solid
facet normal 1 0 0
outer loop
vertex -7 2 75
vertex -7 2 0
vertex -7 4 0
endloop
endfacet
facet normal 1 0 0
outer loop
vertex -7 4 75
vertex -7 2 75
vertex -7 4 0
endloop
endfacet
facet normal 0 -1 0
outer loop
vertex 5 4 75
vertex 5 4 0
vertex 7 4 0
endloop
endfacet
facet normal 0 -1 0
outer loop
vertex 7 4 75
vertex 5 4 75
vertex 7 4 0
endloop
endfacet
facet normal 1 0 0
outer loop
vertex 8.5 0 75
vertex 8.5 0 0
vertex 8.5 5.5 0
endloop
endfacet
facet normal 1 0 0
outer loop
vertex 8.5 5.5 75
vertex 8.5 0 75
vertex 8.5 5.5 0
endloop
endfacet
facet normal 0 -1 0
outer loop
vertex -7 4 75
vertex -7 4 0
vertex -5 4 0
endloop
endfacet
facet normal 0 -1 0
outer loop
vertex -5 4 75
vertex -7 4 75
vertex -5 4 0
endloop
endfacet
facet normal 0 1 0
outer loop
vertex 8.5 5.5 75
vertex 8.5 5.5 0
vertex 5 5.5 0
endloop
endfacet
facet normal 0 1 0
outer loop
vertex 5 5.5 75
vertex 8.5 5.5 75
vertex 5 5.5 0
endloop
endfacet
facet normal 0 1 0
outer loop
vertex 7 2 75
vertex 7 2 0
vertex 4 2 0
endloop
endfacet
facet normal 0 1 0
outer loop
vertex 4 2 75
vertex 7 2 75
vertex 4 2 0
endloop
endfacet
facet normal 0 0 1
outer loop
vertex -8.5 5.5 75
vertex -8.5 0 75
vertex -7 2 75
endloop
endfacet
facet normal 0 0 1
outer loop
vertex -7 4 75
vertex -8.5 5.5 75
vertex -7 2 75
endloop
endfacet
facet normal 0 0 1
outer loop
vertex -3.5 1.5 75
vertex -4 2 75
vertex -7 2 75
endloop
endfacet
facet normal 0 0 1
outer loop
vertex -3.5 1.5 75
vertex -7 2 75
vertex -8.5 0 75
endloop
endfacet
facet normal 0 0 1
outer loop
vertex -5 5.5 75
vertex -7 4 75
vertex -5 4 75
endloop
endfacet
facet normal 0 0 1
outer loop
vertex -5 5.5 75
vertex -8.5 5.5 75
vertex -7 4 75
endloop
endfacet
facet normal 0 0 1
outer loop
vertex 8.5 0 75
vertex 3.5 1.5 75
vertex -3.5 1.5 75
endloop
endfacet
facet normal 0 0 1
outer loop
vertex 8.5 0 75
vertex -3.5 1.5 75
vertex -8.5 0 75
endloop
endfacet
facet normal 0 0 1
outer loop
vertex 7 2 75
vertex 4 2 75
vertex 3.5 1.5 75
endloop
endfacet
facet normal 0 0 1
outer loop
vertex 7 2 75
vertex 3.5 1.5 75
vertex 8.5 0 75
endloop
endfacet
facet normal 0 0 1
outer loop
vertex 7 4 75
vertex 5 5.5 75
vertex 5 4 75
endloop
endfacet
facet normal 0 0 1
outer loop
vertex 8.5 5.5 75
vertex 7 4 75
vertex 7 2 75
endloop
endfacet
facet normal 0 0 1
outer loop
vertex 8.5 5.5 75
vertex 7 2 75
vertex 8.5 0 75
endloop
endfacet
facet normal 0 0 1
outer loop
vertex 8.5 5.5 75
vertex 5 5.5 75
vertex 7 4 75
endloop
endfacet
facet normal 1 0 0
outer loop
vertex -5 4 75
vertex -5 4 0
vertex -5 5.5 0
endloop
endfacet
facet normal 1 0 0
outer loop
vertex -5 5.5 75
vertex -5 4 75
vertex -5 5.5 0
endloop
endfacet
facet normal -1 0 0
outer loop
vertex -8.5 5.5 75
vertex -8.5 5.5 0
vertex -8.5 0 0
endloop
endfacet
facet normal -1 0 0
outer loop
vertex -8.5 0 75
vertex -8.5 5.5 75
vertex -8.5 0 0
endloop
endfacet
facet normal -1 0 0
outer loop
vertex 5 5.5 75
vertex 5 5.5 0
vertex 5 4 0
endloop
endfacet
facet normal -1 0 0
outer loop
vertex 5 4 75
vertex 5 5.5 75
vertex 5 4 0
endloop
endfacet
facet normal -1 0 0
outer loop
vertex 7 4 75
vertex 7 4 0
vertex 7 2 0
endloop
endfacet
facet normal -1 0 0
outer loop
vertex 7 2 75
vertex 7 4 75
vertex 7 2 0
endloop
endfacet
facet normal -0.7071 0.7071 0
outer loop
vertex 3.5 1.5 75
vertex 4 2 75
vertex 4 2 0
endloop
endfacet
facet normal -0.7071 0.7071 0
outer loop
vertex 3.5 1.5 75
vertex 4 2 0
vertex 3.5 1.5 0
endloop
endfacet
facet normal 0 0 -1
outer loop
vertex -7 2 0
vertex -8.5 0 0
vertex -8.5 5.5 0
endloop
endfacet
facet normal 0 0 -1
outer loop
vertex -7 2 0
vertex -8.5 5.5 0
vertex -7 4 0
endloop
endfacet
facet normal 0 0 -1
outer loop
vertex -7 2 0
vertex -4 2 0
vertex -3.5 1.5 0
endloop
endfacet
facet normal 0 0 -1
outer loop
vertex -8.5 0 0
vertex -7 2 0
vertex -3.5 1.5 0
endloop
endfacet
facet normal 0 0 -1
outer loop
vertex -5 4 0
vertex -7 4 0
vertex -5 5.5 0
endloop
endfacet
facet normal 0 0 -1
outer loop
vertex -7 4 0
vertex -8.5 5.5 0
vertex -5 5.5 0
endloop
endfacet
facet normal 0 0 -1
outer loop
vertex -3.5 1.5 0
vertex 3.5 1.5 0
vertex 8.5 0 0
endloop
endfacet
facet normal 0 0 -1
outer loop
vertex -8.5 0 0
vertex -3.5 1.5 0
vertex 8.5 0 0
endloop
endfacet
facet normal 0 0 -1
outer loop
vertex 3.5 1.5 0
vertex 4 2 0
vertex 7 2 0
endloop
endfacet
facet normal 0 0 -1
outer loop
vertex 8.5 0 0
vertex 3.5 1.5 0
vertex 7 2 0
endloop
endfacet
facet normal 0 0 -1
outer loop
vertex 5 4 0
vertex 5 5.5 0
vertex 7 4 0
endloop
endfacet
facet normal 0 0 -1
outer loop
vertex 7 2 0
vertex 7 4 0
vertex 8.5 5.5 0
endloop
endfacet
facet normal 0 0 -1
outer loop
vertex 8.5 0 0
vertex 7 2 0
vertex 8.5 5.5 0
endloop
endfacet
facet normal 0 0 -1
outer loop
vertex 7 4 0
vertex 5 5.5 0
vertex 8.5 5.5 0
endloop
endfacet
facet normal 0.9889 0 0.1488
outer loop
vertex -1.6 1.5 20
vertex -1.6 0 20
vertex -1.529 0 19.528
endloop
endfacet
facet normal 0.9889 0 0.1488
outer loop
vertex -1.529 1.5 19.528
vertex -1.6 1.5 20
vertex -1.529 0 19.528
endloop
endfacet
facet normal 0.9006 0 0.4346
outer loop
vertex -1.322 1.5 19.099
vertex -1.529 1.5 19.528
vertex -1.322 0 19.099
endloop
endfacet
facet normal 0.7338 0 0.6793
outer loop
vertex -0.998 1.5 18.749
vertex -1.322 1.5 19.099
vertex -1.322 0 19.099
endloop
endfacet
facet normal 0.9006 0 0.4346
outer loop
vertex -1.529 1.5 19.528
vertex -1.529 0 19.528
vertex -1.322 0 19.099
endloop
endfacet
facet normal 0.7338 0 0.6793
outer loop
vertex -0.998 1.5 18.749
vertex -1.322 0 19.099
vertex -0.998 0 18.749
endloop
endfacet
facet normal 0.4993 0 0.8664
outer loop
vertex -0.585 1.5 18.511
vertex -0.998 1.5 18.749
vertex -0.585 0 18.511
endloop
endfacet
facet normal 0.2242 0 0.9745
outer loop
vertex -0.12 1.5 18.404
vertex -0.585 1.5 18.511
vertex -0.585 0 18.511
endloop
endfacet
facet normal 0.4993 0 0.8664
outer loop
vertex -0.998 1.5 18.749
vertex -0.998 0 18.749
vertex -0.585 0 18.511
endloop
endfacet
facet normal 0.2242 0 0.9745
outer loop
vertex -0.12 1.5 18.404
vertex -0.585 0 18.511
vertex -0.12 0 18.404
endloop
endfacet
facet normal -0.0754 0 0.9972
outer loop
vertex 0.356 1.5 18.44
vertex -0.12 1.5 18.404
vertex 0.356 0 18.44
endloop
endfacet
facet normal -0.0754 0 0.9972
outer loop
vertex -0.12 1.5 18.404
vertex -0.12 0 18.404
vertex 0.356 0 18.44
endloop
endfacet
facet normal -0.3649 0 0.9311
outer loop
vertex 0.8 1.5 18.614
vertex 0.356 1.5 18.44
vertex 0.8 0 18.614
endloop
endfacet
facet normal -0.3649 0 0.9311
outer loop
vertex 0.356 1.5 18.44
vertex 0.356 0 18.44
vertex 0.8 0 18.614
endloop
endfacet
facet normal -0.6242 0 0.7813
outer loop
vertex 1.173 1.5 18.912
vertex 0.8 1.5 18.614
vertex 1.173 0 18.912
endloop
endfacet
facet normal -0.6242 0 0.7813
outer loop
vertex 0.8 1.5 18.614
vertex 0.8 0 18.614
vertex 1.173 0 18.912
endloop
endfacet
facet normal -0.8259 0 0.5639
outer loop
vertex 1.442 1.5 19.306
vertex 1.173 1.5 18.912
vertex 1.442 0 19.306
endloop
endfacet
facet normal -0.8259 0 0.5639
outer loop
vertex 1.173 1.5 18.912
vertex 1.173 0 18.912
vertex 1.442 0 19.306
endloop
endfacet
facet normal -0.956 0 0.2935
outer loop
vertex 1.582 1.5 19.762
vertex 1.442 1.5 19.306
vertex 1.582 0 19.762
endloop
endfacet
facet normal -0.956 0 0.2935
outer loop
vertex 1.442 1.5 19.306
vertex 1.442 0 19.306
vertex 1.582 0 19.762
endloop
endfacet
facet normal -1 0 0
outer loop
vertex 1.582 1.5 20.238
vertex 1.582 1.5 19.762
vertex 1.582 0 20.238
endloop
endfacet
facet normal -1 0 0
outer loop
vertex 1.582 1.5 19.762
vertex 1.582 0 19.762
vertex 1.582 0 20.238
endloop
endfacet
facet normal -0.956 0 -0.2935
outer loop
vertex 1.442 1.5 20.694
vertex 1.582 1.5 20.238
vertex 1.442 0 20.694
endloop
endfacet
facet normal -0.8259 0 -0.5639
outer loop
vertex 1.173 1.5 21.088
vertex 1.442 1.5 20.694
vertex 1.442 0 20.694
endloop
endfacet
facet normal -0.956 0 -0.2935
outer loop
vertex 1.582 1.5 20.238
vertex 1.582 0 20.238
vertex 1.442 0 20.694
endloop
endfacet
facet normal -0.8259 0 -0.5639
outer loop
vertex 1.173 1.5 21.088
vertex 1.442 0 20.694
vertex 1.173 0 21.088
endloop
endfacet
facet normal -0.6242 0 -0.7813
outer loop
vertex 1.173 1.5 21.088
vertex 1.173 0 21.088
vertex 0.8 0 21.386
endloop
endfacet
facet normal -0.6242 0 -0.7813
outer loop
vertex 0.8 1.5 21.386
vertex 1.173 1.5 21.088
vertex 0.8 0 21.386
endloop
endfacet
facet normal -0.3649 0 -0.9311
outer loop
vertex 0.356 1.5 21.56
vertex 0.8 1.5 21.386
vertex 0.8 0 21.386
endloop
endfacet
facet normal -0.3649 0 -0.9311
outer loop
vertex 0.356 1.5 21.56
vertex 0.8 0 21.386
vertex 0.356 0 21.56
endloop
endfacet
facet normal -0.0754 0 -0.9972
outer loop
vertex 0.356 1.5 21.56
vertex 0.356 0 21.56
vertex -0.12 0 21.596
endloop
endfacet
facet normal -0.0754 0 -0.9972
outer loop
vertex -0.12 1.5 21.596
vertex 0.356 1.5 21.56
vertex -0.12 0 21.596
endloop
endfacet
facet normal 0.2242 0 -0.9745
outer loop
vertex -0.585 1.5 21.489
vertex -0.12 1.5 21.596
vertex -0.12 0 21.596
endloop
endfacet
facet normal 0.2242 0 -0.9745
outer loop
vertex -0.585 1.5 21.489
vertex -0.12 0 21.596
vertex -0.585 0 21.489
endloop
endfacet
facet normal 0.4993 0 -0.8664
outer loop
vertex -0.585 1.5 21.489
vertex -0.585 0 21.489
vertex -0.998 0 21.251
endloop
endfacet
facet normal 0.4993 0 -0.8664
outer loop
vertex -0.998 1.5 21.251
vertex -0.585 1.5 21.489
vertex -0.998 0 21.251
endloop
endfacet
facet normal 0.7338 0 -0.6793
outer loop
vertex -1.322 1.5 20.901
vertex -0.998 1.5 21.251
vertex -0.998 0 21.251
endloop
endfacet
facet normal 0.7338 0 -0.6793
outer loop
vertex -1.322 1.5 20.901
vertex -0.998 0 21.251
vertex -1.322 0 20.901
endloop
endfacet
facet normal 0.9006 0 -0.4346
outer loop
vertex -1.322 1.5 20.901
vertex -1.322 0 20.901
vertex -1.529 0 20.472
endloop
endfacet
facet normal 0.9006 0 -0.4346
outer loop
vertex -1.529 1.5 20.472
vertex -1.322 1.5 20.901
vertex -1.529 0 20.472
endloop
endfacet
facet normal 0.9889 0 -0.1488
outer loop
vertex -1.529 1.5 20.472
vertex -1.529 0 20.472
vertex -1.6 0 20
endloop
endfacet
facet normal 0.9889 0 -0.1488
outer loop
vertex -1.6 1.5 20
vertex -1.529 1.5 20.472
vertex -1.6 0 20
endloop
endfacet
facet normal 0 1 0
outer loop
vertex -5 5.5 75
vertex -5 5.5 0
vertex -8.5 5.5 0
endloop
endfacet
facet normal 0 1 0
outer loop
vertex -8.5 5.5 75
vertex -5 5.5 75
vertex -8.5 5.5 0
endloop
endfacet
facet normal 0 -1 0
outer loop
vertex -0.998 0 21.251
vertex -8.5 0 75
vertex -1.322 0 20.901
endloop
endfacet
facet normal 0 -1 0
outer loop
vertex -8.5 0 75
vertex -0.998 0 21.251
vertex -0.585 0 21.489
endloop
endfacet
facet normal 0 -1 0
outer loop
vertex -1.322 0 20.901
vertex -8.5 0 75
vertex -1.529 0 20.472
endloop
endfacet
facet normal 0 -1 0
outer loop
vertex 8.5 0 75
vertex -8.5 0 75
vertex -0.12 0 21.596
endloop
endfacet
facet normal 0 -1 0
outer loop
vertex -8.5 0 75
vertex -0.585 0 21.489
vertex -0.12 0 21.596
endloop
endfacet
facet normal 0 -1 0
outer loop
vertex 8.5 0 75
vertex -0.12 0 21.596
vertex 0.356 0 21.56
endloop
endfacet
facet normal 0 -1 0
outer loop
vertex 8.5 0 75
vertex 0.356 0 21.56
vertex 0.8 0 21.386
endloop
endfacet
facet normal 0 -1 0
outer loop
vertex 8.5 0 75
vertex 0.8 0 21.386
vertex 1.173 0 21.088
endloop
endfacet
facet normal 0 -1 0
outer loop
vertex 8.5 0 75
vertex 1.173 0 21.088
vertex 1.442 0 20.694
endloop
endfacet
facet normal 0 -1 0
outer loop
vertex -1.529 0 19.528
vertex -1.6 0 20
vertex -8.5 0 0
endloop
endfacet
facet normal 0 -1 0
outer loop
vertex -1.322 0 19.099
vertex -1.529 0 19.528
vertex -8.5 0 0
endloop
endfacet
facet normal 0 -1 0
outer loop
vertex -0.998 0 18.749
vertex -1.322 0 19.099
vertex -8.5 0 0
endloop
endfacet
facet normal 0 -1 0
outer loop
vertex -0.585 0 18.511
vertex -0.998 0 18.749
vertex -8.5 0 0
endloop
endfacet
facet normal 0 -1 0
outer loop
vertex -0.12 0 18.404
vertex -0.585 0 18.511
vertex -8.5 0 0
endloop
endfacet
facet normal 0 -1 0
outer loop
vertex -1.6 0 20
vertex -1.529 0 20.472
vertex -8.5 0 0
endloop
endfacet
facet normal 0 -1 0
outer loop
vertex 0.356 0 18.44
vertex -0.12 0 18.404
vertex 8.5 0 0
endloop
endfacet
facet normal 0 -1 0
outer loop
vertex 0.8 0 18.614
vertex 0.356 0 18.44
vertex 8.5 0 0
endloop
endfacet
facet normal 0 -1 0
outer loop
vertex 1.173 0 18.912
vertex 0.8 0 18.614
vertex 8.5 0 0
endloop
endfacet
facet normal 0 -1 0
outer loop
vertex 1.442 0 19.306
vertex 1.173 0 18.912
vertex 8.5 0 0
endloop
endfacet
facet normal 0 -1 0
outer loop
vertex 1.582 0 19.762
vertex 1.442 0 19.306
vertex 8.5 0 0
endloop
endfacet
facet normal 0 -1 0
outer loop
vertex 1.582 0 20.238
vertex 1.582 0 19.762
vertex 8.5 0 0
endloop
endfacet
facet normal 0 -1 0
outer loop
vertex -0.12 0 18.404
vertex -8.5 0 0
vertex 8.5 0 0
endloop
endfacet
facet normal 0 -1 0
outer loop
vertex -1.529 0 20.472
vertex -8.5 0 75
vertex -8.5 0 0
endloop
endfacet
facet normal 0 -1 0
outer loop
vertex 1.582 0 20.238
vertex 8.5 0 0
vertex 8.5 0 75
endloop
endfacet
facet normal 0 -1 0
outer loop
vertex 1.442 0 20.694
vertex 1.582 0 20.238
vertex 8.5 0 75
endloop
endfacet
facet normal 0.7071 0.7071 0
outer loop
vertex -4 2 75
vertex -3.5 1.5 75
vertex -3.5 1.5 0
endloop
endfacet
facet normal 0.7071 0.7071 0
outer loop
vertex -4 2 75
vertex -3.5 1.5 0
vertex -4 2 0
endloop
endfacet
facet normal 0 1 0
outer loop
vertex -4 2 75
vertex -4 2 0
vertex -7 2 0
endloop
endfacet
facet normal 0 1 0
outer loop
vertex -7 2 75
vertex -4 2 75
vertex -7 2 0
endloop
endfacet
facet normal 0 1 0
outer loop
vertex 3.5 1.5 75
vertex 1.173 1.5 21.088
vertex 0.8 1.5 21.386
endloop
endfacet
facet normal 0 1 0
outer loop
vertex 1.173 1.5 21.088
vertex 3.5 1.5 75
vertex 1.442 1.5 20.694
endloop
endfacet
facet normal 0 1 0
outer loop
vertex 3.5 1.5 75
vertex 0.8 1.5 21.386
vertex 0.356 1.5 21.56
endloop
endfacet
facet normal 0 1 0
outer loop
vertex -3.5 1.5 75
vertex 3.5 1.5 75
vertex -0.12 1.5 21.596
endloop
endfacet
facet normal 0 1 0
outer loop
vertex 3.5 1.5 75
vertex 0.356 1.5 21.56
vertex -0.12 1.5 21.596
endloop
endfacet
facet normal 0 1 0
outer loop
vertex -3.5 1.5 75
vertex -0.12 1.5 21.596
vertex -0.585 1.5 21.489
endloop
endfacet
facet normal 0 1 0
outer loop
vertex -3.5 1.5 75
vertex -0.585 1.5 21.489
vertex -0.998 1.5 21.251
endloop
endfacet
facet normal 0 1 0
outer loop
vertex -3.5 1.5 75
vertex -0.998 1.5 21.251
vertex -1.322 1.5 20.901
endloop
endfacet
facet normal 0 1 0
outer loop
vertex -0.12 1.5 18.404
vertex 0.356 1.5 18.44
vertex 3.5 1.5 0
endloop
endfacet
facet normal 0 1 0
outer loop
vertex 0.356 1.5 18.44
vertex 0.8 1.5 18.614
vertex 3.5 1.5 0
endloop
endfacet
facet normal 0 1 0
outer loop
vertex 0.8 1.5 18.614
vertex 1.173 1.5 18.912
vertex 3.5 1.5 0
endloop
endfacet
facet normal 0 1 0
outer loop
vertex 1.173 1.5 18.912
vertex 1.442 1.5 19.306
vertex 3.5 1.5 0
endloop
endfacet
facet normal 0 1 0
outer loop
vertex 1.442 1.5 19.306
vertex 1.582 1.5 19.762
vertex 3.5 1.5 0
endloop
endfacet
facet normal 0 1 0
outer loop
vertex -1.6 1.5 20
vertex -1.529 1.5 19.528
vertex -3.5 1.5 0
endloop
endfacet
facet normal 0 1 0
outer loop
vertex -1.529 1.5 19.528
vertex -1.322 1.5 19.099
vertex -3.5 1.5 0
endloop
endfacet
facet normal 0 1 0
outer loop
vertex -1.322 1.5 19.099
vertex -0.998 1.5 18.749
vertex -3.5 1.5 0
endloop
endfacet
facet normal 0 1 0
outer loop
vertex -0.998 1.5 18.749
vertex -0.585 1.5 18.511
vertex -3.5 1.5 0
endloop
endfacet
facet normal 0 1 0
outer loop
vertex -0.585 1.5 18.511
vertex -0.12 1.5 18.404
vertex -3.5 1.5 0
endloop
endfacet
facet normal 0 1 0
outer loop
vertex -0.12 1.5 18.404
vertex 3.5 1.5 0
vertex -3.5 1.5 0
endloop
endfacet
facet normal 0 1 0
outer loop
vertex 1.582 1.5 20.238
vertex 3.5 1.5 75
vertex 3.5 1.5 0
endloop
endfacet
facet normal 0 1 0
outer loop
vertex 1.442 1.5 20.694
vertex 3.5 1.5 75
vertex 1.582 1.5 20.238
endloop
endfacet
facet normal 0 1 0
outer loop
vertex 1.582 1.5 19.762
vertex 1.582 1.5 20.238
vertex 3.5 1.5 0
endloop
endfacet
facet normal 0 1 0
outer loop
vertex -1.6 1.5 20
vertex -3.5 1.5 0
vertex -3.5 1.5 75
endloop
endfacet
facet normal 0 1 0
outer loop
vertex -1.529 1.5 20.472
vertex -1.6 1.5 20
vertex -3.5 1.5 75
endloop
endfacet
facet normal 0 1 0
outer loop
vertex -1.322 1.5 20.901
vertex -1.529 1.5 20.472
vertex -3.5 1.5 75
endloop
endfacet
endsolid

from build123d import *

# Parameters (mm, degrees)
AUFSATZ_LINEAR_AUSTRAGEN1_DEPTH  = 75
F_3_2_3_2_DURCHMESSER_BOHRUNG3_D = 3.2


with BuildPart() as part:
    # Skizze1 → Aufsatz-Linear austragen1 (new body)
    with BuildSketch(Plane.XY):
        Polygon((-8.5, 0), (8.5, 0), (8.5, 5.5), (5, 5.5), (5, 4), (7, 4), (7, 2), (4, 2), (3.5, 1.5), (-3.5, 1.5), (-4, 2), (-7, 2), (-7, 4), (-5, 4), (-5, 5.5), (-8.5, 5.5), align=None)
    extrude(amount=AUFSATZ_LINEAR_AUSTRAGEN1_DEPTH)

    # Ø3.2 (3.2) Durchmesser Bohrung3 (through all)
    with Locations(Plane(origin=(0, 1.5, 0), x_dir=(1, 0, 0), z_dir=(0, 1, 0))):
        with Locations((0, -80), (0, -20), (0, -140)):
            Hole(F_3_2_3_2_DURCHMESSER_BOHRUNG3_D / 2)


solid = part.part
